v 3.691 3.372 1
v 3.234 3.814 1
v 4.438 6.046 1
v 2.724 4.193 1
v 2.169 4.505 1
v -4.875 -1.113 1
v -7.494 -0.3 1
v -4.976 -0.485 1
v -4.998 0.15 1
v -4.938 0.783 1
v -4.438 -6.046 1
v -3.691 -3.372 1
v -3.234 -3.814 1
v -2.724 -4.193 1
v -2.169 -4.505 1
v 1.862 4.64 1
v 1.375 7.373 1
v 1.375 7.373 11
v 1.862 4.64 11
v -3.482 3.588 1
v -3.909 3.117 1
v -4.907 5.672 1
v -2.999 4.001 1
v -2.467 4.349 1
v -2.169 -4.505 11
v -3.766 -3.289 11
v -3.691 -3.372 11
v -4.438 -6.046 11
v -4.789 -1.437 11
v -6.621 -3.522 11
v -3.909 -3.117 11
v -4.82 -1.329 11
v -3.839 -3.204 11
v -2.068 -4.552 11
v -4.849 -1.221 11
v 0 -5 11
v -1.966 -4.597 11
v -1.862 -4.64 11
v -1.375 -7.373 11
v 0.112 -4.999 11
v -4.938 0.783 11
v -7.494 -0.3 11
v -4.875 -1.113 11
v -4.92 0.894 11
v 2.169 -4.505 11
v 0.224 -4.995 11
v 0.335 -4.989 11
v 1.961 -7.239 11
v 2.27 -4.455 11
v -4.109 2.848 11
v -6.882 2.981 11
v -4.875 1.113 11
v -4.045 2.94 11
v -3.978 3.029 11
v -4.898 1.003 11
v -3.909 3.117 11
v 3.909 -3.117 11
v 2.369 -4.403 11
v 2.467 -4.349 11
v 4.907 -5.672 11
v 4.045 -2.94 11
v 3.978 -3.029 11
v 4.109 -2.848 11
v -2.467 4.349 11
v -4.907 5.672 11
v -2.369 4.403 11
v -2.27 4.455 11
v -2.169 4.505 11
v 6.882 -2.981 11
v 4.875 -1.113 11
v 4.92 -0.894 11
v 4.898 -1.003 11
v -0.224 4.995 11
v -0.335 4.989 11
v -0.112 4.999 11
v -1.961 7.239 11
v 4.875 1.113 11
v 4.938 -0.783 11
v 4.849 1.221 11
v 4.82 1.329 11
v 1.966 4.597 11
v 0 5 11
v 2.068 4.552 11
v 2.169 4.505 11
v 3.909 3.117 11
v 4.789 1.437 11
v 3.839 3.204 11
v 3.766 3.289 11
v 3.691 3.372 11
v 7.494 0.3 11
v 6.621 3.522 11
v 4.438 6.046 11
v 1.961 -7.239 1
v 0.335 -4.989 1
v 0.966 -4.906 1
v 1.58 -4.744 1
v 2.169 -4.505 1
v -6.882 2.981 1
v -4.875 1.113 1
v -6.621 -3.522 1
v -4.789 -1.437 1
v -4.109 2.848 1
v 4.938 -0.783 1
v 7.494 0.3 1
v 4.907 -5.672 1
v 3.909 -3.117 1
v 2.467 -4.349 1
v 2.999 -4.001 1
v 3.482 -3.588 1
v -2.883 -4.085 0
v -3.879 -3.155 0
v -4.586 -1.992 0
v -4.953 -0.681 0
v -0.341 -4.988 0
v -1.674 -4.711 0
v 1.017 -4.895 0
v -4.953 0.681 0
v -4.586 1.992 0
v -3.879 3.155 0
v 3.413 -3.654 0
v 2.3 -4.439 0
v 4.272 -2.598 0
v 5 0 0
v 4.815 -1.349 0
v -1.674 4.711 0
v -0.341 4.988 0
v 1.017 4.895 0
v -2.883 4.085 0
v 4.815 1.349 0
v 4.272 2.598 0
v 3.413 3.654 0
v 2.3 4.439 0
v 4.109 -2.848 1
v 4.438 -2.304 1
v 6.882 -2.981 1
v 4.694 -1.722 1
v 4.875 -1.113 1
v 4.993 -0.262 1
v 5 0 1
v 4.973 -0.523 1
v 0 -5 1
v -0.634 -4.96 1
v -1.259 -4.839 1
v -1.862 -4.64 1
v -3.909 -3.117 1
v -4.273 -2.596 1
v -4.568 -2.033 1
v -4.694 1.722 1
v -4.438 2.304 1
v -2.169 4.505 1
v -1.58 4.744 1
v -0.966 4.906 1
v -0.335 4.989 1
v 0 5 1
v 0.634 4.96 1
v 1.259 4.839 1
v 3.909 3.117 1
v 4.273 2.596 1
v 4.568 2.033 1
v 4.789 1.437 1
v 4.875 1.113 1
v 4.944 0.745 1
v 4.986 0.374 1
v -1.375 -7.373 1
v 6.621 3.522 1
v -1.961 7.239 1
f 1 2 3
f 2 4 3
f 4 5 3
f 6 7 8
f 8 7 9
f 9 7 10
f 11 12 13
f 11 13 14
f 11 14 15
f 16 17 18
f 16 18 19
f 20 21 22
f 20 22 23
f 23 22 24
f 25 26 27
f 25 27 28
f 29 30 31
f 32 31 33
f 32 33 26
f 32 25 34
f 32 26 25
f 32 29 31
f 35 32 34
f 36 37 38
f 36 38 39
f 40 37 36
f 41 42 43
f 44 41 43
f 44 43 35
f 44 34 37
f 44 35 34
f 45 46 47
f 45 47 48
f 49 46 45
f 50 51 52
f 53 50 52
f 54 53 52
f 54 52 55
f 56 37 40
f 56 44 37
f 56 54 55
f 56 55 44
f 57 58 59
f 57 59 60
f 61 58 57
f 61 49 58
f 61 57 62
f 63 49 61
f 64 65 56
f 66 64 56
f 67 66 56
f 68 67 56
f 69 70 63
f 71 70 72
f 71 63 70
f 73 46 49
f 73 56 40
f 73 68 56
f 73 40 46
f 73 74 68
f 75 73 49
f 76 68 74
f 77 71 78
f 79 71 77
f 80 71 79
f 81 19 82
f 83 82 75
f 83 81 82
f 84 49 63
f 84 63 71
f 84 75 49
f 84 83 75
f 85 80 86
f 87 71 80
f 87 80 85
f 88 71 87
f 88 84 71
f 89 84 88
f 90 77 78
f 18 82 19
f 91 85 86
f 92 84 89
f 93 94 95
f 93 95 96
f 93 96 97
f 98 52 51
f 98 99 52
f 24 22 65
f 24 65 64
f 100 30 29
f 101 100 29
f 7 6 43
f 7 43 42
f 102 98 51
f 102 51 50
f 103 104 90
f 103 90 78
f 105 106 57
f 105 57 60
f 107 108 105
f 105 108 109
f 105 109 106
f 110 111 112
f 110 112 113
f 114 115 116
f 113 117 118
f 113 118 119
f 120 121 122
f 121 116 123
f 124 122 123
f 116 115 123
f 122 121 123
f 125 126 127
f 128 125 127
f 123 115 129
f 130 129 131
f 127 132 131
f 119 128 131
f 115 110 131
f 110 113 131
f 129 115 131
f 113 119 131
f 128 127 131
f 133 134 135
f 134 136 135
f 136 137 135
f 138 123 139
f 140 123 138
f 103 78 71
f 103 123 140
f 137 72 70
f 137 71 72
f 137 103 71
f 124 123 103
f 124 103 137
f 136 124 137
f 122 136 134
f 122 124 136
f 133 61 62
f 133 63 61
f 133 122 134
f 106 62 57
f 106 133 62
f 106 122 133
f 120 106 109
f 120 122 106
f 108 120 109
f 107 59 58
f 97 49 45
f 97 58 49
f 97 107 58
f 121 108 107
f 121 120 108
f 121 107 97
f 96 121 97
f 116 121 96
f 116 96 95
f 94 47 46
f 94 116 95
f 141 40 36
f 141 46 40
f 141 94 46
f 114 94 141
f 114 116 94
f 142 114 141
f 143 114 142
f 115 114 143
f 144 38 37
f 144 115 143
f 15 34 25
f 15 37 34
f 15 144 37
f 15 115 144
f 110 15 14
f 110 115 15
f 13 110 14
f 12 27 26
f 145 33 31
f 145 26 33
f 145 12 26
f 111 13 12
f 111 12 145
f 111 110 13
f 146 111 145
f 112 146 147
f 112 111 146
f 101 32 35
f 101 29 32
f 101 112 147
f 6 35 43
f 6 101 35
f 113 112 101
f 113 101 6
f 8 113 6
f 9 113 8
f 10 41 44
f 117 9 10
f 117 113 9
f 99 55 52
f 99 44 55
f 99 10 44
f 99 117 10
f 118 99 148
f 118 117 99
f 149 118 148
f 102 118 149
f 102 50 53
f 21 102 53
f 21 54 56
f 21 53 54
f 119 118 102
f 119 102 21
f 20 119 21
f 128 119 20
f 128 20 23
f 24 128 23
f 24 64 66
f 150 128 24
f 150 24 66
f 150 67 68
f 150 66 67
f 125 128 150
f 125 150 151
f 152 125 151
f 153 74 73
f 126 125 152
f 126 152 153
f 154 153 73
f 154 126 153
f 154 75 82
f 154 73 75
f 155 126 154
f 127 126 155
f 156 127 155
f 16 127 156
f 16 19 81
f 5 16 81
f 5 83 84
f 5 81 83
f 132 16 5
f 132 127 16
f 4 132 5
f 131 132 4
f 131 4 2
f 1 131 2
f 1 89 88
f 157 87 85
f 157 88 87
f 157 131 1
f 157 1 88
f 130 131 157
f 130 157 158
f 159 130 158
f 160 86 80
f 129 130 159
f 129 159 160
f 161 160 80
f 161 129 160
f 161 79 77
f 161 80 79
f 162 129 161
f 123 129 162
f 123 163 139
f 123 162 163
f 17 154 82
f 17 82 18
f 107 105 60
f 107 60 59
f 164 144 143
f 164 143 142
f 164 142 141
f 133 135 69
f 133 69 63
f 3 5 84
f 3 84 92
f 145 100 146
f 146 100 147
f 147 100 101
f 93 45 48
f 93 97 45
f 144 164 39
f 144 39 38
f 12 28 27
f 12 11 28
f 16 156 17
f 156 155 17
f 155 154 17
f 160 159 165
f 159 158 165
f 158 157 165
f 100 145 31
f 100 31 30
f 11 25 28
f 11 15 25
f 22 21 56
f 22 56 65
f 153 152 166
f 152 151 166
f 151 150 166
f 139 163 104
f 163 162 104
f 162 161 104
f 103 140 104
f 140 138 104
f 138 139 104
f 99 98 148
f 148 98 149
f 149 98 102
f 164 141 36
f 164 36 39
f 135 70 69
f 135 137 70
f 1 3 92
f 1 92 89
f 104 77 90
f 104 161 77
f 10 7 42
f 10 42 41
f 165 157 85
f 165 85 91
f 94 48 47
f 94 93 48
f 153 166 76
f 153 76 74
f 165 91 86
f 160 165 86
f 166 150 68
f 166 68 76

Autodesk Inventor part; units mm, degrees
ref_plane "YZ Plane" through (0, 0, 0) normal (1, 0, 0) x (0, 1, 0)
ref_plane "XZ Plane" through (0, 0, 0) normal (0, 1, 0) x (-1, 0, 0)
ref_plane "XY Plane" through (0, 0, 0) normal (0, 0, 1) x (1, 0, 0)
sketch "Skizze1" plane through (0, 0, 0) normal (0, 0, 1) x (1, 0, 0)
  circle A0 centre (0, 0) radius 5
  dimension "d0" = 10
extrude "Extrusion1" add sketch "Skizze1" along normal blind 1
sketch "Skizze2" plane through (0, 0, 1) normal (0, 0, 1) x (1, 0, 0)
  circle A0 centre (0, 0) radius 5 projected
  circle A1 centre (0, 0) radius 7.5
  circle A2 centre (0, 0) radius 5 projected
  line L0 (0, -5) -> (-1.3746, -7.373)
  line L1 (-1.3746, -7.373) -> (-1.8625, -4.6402)
  arc A3 (-1.8625, -4.6402) -> (0, -5) centre (0, 0) ccw
  line L2 (2.1694, -4.5048) -> (1.9606, -7.2392)
  line L3 (1.9606, -7.2392) -> (0.3352, -4.9888)
  arc A4 (0.3352, -4.9888) -> (2.1694, -4.5048) centre (0, 0) ccw
  line L4 (3.9092, -3.1174) -> (4.9074, -5.6716)
  line L5 (4.9074, -5.6716) -> (2.4666, -4.3493)
  arc A5 (2.4666, -4.3493) -> (3.9092, -3.1174) centre (0, 0) ccw
  line L6 (4.8746, -1.1126) -> (6.8822, -2.9807)
  line L7 (6.8822, -2.9807) -> (4.1094, -2.8484)
  arc A6 (4.1094, -2.8484) -> (4.8746, -1.1126) centre (0, 0) ccw
  line L8 (4.8746, 1.1126) -> (7.494, 0.3005)
  line L9 (7.494, 0.3005) -> (4.9383, -0.7833)
  arc A7 (4.9383, -0.7833) -> (4.8746, 1.1126) centre (0, 0) ccw
  line L10 (3.9092, 3.1174) -> (6.6214, 3.5223)
  line L11 (6.6214, 3.5223) -> (4.7891, 1.4369)
  arc A8 (4.7891, 1.4369) -> (3.9092, 3.1174) centre (0, 0) ccw
  line L12 (2.1694, 4.5048) -> (4.4375, 6.0464)
  line L13 (4.4375, 6.0464) -> (3.6914, 3.3725)
  arc A9 (3.6914, 3.3725) -> (2.1694, 4.5048) centre (0, 0) ccw
  line L14 (0, 5) -> (1.3746, 7.373)
  line L15 (1.3746, 7.373) -> (1.8625, 4.6402)
  arc A10 (1.8625, 4.6402) -> (0, 5) centre (0, 0) ccw
  line L16 (-2.1694, 4.5048) -> (-1.9606, 7.2392)
  line L17 (-1.9606, 7.2392) -> (-0.3352, 4.9888)
  arc A11 (-0.3352, 4.9888) -> (-2.1694, 4.5048) centre (0, 0) ccw
  line L18 (-3.9092, 3.1174) -> (-4.9074, 5.6716)
  line L19 (-4.9074, 5.6716) -> (-2.4666, 4.3493)
  arc A12 (-2.4666, 4.3493) -> (-3.9092, 3.1174) centre (0, 0) ccw
  line L20 (-4.8746, 1.1126) -> (-6.8822, 2.9807)
  line L21 (-6.8822, 2.9807) -> (-4.1094, 2.8484)
  arc A13 (-4.1094, 2.8484) -> (-4.8746, 1.1126) centre (0, 0) ccw
  line L22 (-4.8746, -1.1126) -> (-7.494, -0.3005)
  line L23 (-7.494, -0.3005) -> (-4.9383, 0.7833)
  arc A14 (-4.9383, 0.7833) -> (-4.8746, -1.1126) centre (0, 0) ccw
  line L24 (-3.9092, -3.1174) -> (-6.6214, -3.5223)
  line L25 (-6.6214, -3.5223) -> (-4.7891, -1.4369)
  arc A15 (-4.7891, -1.4369) -> (-3.9092, -3.1174) centre (0, 0) ccw
  line L26 (-2.1694, -4.5048) -> (-4.4375, -6.0464)
  line L27 (-4.4375, -6.0464) -> (-3.6914, -3.3725)
  arc A16 (-3.6914, -3.3725) -> (-2.1694, -4.5048) centre (0, 0) ccw
  dimension "d3" = 15
  dimension "d6" = 360
extrude "Extrusion2" add sketch "Skizze2" along normal blind 10 contours A0 | A0 L8 L9 | A0 L10 L11 | L6 L7 A0 | A0 L12 L13 | L4 L5 A0 | L15 A0 L14 | L3 A0 L2 | L17 A0 L16 | L1 A0 L0 | L19 A0 L18 | L27 A0 L26 | L21 A0 L20 | L25 A0 L24 | L23 A0 L22
equation "\"d0\" = Durchmesser3"
equation "\"d3\" = Durchmesser1"
equation "\"Durchmesser1\" = 15"
equation "\"Größe1\" = 7"
equation "\"Durchmesser2\" = 3"
equation "\"Durchmesser3\" = 10"
equation "\"Größe3\" = 3"
equation "\"Größe4\" = 15"
properties part number "WelleRuder"
